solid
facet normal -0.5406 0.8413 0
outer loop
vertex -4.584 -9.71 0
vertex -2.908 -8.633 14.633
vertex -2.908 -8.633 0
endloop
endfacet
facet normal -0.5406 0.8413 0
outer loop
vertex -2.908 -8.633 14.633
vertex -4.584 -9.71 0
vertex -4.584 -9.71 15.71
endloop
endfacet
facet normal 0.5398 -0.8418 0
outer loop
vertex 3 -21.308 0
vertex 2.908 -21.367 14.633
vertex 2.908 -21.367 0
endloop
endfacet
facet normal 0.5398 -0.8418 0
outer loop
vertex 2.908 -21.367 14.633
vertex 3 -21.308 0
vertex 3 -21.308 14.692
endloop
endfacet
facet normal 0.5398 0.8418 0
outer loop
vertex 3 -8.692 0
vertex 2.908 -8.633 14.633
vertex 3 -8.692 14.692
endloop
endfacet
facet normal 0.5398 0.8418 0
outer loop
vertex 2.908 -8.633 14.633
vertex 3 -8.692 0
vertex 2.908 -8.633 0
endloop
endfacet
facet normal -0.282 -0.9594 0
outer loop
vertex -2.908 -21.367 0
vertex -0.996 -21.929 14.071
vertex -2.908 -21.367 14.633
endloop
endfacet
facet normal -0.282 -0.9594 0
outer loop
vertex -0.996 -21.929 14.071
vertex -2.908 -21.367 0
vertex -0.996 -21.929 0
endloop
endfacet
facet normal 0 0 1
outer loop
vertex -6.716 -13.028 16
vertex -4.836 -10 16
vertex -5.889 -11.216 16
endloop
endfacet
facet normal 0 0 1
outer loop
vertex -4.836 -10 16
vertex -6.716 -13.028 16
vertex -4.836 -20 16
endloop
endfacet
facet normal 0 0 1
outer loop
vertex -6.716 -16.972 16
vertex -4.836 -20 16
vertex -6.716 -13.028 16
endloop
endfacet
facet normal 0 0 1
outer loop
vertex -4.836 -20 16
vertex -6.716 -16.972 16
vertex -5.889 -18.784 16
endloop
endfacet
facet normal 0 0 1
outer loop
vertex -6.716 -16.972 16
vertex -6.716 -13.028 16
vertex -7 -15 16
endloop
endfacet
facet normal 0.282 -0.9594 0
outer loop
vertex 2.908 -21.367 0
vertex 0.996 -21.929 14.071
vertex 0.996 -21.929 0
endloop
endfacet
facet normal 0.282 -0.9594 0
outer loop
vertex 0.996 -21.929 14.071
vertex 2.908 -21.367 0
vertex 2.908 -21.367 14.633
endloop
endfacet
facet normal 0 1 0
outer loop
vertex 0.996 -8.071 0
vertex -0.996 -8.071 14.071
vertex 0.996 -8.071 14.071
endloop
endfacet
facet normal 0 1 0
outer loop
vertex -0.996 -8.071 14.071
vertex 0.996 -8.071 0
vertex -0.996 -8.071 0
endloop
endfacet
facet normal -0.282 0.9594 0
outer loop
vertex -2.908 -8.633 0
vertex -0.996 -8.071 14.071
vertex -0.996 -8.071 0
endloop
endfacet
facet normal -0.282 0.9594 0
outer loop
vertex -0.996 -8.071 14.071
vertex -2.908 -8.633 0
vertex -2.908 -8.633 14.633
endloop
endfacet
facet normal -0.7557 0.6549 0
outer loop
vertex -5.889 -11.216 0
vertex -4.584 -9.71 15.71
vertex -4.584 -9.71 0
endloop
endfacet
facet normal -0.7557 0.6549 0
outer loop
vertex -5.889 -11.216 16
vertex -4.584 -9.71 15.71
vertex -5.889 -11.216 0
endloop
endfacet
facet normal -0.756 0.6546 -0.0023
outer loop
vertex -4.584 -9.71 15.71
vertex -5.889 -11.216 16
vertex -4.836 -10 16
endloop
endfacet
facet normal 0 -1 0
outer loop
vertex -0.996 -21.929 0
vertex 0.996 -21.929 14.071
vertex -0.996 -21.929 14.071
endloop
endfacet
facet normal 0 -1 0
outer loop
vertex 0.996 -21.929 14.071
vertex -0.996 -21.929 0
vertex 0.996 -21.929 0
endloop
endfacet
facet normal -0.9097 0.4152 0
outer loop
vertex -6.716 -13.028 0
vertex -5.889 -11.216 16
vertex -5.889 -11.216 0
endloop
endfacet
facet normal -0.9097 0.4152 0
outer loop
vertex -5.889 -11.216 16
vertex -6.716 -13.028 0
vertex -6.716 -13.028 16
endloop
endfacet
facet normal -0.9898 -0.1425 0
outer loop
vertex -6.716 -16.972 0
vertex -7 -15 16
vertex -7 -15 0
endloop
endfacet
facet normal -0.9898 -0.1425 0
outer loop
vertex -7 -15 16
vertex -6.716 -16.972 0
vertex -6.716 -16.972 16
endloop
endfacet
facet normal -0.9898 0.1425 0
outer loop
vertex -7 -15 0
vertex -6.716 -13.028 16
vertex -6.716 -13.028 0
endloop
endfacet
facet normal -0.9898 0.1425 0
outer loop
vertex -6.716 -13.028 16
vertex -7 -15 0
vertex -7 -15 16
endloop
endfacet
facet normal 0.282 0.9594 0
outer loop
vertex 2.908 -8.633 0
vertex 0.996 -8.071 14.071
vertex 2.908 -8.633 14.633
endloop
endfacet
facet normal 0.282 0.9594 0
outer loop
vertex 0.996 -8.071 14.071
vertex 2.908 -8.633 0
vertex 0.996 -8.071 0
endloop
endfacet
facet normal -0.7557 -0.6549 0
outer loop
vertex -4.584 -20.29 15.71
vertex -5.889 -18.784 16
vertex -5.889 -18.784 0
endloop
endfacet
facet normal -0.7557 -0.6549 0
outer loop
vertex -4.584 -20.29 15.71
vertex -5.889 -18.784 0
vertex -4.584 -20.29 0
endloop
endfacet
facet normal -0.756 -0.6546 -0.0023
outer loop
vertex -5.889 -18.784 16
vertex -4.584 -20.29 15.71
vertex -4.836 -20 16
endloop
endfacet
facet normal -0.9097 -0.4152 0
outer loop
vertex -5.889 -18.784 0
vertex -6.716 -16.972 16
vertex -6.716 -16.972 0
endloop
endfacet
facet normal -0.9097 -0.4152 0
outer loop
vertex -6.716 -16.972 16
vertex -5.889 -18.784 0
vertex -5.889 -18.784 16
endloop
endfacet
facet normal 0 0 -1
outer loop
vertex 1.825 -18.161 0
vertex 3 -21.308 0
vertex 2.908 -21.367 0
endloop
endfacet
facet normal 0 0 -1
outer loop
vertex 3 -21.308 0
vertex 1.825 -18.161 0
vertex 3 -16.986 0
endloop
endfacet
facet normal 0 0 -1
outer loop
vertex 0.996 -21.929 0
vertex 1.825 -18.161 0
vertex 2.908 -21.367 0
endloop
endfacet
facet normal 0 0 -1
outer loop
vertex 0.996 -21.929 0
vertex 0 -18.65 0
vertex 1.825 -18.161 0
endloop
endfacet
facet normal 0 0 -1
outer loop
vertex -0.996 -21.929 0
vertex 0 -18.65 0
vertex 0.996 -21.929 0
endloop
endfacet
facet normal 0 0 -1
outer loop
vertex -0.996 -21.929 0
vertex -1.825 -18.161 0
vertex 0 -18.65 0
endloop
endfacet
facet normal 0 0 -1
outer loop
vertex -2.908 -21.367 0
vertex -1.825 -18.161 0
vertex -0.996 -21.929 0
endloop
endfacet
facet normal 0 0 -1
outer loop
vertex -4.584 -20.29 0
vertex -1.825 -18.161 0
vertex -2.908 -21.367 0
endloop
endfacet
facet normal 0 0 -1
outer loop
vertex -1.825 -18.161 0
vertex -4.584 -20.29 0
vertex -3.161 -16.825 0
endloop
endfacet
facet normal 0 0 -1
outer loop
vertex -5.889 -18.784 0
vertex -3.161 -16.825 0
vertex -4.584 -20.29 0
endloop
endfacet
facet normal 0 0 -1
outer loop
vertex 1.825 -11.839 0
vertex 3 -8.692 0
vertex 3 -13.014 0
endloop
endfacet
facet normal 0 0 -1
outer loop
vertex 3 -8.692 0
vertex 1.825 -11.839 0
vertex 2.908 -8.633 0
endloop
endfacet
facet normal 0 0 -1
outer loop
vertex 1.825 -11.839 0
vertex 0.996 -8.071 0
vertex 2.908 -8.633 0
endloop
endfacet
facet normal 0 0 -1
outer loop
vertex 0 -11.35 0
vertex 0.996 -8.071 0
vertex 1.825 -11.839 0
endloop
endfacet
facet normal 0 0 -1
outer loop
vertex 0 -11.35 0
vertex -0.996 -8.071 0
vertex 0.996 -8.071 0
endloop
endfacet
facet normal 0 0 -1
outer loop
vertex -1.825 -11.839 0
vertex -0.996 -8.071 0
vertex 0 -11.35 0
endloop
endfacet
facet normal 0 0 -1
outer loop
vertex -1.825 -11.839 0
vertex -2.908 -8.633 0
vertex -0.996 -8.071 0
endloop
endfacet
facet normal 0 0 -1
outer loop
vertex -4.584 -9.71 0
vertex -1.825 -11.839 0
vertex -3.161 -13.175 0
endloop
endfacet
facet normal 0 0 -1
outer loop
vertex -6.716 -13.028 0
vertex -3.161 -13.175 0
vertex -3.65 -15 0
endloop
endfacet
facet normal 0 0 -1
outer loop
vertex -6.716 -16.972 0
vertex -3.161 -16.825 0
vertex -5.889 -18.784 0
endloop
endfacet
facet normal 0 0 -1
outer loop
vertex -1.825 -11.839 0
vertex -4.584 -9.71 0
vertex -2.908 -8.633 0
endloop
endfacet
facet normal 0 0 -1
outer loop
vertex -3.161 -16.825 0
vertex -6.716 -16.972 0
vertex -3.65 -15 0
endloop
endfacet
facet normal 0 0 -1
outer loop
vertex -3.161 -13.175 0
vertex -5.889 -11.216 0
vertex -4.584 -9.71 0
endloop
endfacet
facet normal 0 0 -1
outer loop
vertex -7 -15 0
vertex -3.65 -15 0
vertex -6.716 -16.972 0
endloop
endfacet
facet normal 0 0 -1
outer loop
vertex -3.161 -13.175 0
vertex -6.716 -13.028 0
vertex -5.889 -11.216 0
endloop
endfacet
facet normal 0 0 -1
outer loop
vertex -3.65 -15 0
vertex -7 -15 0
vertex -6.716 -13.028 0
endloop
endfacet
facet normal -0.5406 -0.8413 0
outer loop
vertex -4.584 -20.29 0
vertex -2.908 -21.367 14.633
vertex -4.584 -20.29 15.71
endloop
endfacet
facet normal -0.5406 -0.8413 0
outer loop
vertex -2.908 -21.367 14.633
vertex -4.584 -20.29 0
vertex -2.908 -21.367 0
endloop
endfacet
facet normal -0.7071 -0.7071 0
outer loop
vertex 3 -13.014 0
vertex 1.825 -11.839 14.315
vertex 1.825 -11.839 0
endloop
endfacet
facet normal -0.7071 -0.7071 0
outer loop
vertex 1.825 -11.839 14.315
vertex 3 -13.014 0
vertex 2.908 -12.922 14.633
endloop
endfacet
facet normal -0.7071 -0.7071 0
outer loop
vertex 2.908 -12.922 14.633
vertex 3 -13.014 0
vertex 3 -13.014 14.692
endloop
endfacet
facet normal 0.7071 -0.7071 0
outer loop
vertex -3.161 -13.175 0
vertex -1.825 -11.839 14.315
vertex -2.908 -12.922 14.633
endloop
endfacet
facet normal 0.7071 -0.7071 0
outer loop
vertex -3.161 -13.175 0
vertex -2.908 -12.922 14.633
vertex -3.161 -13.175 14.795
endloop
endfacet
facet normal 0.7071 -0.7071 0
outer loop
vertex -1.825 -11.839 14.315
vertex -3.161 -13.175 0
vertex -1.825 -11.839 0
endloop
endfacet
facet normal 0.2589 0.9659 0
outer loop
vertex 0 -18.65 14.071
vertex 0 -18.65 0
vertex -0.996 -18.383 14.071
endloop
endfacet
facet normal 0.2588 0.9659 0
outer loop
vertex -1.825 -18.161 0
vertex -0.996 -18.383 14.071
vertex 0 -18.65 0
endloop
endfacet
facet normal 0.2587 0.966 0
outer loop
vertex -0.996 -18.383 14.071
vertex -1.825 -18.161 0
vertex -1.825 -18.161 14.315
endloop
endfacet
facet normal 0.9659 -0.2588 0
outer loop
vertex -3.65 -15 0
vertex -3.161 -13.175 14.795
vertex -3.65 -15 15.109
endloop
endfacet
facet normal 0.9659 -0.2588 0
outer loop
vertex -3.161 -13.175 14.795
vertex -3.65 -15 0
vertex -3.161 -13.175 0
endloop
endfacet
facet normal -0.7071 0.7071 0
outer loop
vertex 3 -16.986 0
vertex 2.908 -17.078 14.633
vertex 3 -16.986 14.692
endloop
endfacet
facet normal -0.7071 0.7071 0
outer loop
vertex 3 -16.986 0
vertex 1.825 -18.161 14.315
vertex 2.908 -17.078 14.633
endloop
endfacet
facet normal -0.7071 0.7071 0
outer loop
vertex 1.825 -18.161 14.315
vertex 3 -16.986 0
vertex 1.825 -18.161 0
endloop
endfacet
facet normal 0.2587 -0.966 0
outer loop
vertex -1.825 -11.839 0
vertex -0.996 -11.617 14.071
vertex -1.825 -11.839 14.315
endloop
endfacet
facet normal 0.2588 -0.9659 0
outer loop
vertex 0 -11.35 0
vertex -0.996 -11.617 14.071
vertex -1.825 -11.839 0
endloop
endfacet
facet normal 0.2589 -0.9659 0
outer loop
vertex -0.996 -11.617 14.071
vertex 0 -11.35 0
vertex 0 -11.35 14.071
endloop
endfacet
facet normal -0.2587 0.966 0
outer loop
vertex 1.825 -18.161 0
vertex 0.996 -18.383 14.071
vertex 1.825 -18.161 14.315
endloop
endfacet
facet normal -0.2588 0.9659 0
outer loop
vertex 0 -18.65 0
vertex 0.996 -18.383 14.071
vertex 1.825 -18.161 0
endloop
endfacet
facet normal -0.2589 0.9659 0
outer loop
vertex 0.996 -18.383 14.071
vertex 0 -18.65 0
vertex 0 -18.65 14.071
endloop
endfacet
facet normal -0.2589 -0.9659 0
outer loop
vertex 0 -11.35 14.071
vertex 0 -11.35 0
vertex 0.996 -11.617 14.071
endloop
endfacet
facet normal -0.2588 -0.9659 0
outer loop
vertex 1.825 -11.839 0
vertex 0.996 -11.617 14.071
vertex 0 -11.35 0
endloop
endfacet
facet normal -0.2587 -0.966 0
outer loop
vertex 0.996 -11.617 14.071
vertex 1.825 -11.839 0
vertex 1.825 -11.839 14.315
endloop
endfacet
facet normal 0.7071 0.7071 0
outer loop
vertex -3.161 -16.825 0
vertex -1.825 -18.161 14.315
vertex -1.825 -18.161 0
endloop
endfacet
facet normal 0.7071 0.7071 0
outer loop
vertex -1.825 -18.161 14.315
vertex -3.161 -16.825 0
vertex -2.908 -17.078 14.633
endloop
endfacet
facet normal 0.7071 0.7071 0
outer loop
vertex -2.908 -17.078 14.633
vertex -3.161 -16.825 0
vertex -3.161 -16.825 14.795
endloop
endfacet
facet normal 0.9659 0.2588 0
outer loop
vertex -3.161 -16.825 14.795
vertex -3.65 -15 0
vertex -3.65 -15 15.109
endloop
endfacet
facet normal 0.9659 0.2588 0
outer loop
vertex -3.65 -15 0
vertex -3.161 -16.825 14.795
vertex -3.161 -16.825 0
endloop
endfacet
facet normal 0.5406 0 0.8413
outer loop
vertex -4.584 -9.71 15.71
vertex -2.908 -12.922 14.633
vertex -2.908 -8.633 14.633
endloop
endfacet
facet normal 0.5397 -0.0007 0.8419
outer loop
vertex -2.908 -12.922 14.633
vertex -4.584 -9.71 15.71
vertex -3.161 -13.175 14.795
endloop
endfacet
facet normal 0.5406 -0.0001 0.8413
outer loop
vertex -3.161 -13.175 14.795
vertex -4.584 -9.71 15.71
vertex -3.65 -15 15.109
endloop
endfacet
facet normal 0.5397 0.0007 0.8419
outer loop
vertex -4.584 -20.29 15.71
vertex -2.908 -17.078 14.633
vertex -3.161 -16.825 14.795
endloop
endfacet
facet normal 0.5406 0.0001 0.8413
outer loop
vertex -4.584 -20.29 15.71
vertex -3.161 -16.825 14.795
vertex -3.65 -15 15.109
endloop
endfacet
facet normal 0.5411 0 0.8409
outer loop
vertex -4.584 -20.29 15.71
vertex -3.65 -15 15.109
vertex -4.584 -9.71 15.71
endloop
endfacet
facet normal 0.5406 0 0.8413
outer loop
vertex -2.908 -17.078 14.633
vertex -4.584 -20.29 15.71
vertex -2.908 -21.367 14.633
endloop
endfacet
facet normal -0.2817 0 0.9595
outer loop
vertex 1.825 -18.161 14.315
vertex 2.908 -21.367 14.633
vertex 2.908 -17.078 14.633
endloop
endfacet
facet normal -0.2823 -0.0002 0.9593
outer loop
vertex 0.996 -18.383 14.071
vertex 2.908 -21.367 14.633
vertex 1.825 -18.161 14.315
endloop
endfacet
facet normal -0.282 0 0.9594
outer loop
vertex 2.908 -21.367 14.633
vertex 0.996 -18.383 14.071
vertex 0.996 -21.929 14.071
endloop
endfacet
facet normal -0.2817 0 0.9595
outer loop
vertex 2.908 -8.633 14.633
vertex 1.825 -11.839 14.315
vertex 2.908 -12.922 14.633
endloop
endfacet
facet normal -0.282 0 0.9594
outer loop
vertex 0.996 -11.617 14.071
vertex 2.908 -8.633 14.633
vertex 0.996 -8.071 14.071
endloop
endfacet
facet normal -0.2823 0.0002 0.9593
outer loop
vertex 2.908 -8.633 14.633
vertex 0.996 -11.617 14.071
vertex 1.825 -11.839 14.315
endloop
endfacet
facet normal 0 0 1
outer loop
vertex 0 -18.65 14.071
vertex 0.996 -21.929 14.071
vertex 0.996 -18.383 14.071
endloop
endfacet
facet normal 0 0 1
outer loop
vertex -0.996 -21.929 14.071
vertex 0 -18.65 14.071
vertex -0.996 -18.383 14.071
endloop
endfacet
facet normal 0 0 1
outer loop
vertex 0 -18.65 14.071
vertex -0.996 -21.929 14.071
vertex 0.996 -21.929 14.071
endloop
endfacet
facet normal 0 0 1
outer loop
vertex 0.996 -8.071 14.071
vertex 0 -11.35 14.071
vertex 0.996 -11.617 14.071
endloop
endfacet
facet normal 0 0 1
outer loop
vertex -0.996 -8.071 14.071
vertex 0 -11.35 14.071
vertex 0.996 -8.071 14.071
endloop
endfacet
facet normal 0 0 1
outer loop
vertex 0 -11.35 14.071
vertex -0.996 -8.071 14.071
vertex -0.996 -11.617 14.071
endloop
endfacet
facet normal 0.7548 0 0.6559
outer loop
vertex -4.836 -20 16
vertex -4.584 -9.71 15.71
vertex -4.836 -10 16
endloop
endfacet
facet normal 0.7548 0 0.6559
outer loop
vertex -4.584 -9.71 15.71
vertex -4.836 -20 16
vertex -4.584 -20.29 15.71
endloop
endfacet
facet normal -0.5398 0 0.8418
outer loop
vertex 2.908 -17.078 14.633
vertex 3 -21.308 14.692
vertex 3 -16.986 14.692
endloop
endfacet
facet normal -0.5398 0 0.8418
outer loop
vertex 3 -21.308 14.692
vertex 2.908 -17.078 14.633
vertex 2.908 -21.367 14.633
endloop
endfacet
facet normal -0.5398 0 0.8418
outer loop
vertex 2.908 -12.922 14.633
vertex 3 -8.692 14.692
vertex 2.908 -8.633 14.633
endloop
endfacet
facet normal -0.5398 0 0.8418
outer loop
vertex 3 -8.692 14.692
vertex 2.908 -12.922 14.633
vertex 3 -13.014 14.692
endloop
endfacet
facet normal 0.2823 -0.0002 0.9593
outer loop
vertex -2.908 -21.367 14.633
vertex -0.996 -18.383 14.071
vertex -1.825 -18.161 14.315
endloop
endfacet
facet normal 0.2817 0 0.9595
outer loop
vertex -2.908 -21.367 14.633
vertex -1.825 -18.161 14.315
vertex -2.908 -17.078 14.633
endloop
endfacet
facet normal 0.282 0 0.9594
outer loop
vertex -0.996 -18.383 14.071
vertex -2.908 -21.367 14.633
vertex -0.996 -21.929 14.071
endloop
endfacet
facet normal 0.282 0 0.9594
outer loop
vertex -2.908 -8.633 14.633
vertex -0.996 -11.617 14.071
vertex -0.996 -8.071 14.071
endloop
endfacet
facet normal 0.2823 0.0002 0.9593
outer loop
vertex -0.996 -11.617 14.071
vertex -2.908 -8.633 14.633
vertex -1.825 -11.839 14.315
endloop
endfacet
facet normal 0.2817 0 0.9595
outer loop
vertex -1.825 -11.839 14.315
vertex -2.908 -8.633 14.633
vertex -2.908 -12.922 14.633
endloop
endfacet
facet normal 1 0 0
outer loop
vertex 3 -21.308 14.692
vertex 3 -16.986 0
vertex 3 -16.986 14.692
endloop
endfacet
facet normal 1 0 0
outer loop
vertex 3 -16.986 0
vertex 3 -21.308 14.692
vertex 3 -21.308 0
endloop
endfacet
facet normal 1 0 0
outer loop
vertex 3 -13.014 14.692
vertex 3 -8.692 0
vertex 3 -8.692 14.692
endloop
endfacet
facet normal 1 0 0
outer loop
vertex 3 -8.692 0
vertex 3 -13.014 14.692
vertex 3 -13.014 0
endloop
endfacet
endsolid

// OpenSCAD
difference(){
{difference(){
{difference(){
translate([0,-15,0]){
    difference(){
cylinder(16, 7,7);
  cylinder(16, 7.3/2,7.3/2);}}
  
  
 translate([0,-5, 21]) rotate([90,0,0]) cylinder(40, 7,7);}}
 
 
 translate([-7,-22.5,37]) cube(15);}}
 
 
 
 // slit to see amount of pollen
 
 
 
 translate([3,-23 ,0]) cube([5, 20, 40]);}
